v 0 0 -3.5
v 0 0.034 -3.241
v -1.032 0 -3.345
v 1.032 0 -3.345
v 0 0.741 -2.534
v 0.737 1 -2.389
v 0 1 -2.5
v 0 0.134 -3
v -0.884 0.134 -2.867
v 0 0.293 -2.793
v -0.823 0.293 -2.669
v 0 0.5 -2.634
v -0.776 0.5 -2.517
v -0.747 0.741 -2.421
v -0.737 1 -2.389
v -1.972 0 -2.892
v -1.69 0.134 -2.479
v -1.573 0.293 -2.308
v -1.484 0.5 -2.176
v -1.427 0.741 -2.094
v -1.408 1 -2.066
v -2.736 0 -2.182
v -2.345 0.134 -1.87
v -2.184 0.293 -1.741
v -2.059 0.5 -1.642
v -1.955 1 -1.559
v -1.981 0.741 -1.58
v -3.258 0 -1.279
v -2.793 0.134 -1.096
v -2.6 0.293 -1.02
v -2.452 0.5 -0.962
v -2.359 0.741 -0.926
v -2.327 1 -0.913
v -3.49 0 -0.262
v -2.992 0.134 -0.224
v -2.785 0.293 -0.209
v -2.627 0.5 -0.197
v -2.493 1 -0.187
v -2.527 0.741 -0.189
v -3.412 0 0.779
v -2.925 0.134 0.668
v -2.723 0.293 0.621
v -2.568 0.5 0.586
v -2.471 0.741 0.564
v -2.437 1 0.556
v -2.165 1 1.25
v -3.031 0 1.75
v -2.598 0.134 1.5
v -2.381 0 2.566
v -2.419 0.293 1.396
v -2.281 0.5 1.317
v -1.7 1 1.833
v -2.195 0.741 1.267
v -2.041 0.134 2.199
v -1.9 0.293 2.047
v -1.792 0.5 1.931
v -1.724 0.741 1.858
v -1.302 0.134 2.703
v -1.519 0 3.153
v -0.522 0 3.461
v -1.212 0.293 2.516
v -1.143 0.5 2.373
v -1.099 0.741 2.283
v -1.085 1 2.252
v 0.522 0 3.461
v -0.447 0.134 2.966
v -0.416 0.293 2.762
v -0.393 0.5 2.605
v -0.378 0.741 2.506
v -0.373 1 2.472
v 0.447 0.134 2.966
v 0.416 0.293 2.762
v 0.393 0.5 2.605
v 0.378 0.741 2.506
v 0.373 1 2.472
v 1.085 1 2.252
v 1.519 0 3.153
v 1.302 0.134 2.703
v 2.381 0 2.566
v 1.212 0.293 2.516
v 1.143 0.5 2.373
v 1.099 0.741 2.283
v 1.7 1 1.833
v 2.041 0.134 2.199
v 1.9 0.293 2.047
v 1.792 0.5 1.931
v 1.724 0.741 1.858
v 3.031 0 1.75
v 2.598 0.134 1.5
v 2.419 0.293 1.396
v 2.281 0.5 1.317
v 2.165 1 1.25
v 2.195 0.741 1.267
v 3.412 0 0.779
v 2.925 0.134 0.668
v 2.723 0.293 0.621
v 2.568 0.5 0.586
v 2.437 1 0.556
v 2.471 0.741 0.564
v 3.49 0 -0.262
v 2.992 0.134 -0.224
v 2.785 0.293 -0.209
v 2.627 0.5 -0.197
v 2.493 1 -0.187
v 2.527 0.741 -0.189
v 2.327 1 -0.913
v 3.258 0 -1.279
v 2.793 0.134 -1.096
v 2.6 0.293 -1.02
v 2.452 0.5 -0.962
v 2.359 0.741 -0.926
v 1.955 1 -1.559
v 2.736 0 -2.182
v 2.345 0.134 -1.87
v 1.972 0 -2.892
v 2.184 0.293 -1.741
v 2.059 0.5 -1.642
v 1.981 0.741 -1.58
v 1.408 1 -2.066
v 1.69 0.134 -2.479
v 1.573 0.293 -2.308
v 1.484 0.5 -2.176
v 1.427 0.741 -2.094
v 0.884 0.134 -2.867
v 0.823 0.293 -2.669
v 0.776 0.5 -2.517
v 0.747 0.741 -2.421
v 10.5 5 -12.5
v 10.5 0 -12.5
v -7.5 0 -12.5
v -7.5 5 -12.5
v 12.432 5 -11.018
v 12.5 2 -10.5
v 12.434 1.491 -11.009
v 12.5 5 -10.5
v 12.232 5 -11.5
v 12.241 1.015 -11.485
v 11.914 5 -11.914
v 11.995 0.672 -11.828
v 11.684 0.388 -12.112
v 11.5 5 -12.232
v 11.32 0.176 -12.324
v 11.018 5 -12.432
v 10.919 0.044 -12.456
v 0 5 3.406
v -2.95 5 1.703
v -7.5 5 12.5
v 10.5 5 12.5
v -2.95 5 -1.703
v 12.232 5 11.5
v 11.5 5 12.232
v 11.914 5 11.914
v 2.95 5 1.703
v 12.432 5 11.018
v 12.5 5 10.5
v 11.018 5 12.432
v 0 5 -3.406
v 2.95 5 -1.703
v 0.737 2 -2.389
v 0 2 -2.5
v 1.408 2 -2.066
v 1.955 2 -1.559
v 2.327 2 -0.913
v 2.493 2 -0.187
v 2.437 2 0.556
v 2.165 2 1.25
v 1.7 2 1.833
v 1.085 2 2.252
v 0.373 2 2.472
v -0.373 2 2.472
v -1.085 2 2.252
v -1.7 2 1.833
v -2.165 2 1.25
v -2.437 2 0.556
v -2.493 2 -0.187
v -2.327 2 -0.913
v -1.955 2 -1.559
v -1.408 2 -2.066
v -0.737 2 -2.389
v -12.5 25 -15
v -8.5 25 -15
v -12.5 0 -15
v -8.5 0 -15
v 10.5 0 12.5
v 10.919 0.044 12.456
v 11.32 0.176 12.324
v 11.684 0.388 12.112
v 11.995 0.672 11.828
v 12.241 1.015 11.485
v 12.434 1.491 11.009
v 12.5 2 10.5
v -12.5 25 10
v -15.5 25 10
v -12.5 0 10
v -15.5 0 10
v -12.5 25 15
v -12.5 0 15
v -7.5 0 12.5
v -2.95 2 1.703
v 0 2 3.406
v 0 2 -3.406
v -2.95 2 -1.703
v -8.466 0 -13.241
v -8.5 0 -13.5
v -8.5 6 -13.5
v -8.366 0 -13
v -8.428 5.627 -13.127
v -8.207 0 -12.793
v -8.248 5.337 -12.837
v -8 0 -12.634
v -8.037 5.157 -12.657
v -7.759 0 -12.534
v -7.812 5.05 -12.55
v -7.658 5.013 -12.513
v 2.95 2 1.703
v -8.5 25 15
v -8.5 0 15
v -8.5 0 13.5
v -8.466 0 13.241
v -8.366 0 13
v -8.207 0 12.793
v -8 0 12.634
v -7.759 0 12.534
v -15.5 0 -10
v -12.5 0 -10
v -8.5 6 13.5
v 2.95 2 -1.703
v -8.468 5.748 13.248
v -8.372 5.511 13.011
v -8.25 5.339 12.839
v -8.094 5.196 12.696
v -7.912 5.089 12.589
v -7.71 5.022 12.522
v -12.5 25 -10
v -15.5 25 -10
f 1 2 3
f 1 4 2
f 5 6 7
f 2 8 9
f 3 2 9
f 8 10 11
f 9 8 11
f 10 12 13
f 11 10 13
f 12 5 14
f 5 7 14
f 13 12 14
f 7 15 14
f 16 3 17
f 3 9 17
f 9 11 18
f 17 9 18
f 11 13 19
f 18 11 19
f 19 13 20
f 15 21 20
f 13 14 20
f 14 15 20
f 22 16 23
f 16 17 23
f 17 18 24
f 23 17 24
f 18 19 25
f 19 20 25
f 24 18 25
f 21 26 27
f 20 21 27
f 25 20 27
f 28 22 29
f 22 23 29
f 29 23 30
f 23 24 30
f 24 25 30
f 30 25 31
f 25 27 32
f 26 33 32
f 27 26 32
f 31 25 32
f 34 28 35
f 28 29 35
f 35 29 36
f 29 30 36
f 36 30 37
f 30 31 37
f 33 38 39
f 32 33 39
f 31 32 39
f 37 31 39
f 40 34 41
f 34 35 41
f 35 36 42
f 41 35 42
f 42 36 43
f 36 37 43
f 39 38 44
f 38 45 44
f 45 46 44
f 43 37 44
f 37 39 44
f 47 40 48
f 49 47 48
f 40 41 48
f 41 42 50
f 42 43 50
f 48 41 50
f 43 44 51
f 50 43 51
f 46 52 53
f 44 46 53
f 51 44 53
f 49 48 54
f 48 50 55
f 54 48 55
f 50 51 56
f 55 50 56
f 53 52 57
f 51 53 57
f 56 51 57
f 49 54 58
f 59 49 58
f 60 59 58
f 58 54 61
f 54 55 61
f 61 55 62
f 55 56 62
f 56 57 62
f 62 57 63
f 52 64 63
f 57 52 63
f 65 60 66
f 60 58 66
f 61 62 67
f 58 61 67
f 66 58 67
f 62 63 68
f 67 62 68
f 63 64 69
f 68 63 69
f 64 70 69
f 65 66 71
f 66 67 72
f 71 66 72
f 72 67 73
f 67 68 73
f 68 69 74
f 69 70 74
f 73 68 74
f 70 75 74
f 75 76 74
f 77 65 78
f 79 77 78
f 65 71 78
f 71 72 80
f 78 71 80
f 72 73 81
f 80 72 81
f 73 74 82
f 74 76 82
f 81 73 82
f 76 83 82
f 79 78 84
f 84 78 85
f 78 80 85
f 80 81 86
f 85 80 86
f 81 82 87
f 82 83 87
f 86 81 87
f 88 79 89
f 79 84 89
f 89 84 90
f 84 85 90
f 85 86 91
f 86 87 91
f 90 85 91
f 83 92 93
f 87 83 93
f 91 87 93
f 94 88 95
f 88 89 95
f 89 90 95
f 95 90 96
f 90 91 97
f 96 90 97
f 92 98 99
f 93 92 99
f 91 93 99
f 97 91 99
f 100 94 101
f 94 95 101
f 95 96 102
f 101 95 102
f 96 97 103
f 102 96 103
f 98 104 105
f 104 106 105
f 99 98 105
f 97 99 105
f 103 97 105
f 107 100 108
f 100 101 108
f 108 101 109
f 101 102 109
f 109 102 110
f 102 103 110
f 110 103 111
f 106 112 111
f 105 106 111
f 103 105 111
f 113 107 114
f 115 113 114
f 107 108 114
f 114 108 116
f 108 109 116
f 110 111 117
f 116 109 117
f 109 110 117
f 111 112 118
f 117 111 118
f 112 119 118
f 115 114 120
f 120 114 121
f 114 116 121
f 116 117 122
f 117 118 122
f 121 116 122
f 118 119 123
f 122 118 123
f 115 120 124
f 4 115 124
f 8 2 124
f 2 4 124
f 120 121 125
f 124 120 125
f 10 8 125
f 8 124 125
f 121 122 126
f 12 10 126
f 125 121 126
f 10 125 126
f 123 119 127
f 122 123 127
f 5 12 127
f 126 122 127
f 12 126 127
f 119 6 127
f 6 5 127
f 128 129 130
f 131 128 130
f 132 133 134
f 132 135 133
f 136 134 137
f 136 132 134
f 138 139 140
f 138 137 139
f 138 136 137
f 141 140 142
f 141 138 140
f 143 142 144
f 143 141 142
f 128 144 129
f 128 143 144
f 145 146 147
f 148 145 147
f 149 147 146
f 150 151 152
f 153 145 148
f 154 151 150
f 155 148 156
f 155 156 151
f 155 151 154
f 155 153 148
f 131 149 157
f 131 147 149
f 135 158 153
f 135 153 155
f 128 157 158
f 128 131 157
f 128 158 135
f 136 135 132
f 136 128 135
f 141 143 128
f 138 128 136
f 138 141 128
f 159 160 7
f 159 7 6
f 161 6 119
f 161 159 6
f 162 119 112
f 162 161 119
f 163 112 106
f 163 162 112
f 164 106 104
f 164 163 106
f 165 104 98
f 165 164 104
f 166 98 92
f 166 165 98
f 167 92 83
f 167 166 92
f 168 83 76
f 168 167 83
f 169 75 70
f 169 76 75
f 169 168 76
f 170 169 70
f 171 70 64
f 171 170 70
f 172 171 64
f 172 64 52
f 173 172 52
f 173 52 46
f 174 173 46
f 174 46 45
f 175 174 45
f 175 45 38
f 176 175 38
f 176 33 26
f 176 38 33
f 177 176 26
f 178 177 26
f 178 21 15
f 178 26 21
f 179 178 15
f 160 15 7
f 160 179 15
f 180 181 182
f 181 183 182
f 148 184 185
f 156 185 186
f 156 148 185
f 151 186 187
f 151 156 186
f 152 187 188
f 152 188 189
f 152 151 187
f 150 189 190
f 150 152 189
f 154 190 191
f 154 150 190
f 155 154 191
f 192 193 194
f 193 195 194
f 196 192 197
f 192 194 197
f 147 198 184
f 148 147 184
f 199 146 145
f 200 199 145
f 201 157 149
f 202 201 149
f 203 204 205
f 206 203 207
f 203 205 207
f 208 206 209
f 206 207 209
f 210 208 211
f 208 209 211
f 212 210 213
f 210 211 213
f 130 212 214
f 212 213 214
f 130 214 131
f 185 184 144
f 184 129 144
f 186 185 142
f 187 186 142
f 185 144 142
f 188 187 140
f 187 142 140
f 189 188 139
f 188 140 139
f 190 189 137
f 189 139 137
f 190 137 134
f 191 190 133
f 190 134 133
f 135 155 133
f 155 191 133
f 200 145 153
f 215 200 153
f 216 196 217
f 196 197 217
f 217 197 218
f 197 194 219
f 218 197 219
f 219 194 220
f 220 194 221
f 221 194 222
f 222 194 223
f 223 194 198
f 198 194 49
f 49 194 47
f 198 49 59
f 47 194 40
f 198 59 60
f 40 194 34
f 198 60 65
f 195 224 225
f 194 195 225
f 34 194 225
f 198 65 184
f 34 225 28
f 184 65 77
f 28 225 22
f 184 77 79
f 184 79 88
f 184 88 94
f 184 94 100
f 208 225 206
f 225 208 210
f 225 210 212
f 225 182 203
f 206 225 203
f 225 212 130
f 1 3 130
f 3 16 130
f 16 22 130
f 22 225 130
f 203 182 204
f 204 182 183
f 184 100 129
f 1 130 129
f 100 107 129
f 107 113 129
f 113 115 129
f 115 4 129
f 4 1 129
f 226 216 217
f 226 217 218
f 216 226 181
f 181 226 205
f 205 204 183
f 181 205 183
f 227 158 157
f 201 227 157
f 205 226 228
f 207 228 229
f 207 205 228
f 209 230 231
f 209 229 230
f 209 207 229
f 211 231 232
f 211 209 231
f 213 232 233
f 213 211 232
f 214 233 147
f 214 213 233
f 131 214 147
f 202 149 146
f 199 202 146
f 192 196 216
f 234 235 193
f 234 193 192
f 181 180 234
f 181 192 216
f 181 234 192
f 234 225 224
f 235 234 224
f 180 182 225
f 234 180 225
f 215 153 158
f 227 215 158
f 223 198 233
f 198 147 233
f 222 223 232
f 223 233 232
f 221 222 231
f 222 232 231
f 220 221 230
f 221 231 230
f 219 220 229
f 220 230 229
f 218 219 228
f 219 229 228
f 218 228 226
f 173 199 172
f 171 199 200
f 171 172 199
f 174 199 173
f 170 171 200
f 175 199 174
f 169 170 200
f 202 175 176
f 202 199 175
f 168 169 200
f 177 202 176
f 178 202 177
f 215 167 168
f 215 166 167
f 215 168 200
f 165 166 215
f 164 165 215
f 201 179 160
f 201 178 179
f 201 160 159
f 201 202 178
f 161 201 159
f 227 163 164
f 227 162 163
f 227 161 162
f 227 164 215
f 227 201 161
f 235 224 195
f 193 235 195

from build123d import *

# Parameters (mm, degrees)
BOSS_EXTRUDE1_DEPTH     = 5
BOSS_EXTRUDE2_DEPTH     = 20
CUT_EXTRUDE1_DEPTH      = 34.018933962
CUT_EXTRUDE1_DEPTH_BACK = 34.018933962
SKETCH4_R               = 2.5
FILLET1_R               = 1
FILLET2_R               = 1
FILLET3_R               = 2
CUT_EXTRUDE2_DEPTH      = 3


with BuildPart() as part:
    # Sketch2 → Boss-Extrude1 (new body)
    with BuildSketch(Plane(origin=(0, 0, 0), x_dir=(1, 0, 0), z_dir=(0, 1, 0))):
        Polygon((-8.5, -12.5), (12.5, -12.5), (12.5, 12.5), (-8.5, 12.5), (-8.5, 15), (-12.5, 15), (-12.5, 10), (-15.5, 10), (-15.5, -10), (-12.5, -10), (-12.5, -15), (-8.5, -15), align=None)
    extrude(amount=BOSS_EXTRUDE1_DEPTH)

    # Sketch3 → Boss-Extrude2 (add)
    with BuildSketch(Plane(origin=(0, 5, 0), x_dir=(1, 0, 0), z_dir=(0, 1, 0))):
        Polygon((-15.5, 10), (-15.5, -10), (-12.5, -10), (-12.5, -15), (-8.5, -15), (-8.5, 15), (-12.5, 15), (-12.5, 10), align=None)
    extrude(amount=BOSS_EXTRUDE2_DEPTH)

    # Sketch4 → Cut-Extrude1 (cut, two sides: drawn at the far end of the back side and taken through both)
    with BuildSketch(Plane.XZ.offset(-CUT_EXTRUDE1_DEPTH_BACK)):
        with Locations(Location((0, 0, 0), (0, 0, 270))):
            Circle(SKETCH4_R)
    extrude(amount=CUT_EXTRUDE1_DEPTH + CUT_EXTRUDE1_DEPTH_BACK, mode=Mode.SUBTRACT)

    # Fillet1
    fillet1_edges = [part.edges().sort_by_distance(p)[0] for p in [
        (0, 0, 2.5),
    ]]
    fillet(fillet1_edges, radius=FILLET1_R)

    # Fillet2
    fillet2_edges = [part.edges().sort_by_distance(p)[0] for p in [
        (-8.5, 2.5, -12.5),
        (-8.5, 2.5, 12.5),
        (-8.5, 5, 0),
    ]]
    fillet(fillet2_edges, radius=FILLET2_R)

    # Fillet3
    fillet3_edges = [part.edges().sort_by_distance(p)[0] for p in [
        (12.5, 0, 0),
        (12.5, 2.5, -12.5),
        (12.5, 2.5, 12.5),
    ]]
    fillet(fillet3_edges, radius=FILLET3_R)

    # Sketch5 → Cut-Extrude2 (cut)
    with BuildSketch(Plane(origin=(0, 5, 0), x_dir=(1, 0, 0), z_dir=(0, 1, 0))):
        Polygon((2.95, 1.703183294), (0, 3.406366588), (-2.95, 1.703183294), (-2.95, -1.703183294), (0, -3.406366588), (2.95, -1.703183294), align=None)
    extrude(amount=-CUT_EXTRUDE2_DEPTH, mode=Mode.SUBTRACT)


solid = part.part
